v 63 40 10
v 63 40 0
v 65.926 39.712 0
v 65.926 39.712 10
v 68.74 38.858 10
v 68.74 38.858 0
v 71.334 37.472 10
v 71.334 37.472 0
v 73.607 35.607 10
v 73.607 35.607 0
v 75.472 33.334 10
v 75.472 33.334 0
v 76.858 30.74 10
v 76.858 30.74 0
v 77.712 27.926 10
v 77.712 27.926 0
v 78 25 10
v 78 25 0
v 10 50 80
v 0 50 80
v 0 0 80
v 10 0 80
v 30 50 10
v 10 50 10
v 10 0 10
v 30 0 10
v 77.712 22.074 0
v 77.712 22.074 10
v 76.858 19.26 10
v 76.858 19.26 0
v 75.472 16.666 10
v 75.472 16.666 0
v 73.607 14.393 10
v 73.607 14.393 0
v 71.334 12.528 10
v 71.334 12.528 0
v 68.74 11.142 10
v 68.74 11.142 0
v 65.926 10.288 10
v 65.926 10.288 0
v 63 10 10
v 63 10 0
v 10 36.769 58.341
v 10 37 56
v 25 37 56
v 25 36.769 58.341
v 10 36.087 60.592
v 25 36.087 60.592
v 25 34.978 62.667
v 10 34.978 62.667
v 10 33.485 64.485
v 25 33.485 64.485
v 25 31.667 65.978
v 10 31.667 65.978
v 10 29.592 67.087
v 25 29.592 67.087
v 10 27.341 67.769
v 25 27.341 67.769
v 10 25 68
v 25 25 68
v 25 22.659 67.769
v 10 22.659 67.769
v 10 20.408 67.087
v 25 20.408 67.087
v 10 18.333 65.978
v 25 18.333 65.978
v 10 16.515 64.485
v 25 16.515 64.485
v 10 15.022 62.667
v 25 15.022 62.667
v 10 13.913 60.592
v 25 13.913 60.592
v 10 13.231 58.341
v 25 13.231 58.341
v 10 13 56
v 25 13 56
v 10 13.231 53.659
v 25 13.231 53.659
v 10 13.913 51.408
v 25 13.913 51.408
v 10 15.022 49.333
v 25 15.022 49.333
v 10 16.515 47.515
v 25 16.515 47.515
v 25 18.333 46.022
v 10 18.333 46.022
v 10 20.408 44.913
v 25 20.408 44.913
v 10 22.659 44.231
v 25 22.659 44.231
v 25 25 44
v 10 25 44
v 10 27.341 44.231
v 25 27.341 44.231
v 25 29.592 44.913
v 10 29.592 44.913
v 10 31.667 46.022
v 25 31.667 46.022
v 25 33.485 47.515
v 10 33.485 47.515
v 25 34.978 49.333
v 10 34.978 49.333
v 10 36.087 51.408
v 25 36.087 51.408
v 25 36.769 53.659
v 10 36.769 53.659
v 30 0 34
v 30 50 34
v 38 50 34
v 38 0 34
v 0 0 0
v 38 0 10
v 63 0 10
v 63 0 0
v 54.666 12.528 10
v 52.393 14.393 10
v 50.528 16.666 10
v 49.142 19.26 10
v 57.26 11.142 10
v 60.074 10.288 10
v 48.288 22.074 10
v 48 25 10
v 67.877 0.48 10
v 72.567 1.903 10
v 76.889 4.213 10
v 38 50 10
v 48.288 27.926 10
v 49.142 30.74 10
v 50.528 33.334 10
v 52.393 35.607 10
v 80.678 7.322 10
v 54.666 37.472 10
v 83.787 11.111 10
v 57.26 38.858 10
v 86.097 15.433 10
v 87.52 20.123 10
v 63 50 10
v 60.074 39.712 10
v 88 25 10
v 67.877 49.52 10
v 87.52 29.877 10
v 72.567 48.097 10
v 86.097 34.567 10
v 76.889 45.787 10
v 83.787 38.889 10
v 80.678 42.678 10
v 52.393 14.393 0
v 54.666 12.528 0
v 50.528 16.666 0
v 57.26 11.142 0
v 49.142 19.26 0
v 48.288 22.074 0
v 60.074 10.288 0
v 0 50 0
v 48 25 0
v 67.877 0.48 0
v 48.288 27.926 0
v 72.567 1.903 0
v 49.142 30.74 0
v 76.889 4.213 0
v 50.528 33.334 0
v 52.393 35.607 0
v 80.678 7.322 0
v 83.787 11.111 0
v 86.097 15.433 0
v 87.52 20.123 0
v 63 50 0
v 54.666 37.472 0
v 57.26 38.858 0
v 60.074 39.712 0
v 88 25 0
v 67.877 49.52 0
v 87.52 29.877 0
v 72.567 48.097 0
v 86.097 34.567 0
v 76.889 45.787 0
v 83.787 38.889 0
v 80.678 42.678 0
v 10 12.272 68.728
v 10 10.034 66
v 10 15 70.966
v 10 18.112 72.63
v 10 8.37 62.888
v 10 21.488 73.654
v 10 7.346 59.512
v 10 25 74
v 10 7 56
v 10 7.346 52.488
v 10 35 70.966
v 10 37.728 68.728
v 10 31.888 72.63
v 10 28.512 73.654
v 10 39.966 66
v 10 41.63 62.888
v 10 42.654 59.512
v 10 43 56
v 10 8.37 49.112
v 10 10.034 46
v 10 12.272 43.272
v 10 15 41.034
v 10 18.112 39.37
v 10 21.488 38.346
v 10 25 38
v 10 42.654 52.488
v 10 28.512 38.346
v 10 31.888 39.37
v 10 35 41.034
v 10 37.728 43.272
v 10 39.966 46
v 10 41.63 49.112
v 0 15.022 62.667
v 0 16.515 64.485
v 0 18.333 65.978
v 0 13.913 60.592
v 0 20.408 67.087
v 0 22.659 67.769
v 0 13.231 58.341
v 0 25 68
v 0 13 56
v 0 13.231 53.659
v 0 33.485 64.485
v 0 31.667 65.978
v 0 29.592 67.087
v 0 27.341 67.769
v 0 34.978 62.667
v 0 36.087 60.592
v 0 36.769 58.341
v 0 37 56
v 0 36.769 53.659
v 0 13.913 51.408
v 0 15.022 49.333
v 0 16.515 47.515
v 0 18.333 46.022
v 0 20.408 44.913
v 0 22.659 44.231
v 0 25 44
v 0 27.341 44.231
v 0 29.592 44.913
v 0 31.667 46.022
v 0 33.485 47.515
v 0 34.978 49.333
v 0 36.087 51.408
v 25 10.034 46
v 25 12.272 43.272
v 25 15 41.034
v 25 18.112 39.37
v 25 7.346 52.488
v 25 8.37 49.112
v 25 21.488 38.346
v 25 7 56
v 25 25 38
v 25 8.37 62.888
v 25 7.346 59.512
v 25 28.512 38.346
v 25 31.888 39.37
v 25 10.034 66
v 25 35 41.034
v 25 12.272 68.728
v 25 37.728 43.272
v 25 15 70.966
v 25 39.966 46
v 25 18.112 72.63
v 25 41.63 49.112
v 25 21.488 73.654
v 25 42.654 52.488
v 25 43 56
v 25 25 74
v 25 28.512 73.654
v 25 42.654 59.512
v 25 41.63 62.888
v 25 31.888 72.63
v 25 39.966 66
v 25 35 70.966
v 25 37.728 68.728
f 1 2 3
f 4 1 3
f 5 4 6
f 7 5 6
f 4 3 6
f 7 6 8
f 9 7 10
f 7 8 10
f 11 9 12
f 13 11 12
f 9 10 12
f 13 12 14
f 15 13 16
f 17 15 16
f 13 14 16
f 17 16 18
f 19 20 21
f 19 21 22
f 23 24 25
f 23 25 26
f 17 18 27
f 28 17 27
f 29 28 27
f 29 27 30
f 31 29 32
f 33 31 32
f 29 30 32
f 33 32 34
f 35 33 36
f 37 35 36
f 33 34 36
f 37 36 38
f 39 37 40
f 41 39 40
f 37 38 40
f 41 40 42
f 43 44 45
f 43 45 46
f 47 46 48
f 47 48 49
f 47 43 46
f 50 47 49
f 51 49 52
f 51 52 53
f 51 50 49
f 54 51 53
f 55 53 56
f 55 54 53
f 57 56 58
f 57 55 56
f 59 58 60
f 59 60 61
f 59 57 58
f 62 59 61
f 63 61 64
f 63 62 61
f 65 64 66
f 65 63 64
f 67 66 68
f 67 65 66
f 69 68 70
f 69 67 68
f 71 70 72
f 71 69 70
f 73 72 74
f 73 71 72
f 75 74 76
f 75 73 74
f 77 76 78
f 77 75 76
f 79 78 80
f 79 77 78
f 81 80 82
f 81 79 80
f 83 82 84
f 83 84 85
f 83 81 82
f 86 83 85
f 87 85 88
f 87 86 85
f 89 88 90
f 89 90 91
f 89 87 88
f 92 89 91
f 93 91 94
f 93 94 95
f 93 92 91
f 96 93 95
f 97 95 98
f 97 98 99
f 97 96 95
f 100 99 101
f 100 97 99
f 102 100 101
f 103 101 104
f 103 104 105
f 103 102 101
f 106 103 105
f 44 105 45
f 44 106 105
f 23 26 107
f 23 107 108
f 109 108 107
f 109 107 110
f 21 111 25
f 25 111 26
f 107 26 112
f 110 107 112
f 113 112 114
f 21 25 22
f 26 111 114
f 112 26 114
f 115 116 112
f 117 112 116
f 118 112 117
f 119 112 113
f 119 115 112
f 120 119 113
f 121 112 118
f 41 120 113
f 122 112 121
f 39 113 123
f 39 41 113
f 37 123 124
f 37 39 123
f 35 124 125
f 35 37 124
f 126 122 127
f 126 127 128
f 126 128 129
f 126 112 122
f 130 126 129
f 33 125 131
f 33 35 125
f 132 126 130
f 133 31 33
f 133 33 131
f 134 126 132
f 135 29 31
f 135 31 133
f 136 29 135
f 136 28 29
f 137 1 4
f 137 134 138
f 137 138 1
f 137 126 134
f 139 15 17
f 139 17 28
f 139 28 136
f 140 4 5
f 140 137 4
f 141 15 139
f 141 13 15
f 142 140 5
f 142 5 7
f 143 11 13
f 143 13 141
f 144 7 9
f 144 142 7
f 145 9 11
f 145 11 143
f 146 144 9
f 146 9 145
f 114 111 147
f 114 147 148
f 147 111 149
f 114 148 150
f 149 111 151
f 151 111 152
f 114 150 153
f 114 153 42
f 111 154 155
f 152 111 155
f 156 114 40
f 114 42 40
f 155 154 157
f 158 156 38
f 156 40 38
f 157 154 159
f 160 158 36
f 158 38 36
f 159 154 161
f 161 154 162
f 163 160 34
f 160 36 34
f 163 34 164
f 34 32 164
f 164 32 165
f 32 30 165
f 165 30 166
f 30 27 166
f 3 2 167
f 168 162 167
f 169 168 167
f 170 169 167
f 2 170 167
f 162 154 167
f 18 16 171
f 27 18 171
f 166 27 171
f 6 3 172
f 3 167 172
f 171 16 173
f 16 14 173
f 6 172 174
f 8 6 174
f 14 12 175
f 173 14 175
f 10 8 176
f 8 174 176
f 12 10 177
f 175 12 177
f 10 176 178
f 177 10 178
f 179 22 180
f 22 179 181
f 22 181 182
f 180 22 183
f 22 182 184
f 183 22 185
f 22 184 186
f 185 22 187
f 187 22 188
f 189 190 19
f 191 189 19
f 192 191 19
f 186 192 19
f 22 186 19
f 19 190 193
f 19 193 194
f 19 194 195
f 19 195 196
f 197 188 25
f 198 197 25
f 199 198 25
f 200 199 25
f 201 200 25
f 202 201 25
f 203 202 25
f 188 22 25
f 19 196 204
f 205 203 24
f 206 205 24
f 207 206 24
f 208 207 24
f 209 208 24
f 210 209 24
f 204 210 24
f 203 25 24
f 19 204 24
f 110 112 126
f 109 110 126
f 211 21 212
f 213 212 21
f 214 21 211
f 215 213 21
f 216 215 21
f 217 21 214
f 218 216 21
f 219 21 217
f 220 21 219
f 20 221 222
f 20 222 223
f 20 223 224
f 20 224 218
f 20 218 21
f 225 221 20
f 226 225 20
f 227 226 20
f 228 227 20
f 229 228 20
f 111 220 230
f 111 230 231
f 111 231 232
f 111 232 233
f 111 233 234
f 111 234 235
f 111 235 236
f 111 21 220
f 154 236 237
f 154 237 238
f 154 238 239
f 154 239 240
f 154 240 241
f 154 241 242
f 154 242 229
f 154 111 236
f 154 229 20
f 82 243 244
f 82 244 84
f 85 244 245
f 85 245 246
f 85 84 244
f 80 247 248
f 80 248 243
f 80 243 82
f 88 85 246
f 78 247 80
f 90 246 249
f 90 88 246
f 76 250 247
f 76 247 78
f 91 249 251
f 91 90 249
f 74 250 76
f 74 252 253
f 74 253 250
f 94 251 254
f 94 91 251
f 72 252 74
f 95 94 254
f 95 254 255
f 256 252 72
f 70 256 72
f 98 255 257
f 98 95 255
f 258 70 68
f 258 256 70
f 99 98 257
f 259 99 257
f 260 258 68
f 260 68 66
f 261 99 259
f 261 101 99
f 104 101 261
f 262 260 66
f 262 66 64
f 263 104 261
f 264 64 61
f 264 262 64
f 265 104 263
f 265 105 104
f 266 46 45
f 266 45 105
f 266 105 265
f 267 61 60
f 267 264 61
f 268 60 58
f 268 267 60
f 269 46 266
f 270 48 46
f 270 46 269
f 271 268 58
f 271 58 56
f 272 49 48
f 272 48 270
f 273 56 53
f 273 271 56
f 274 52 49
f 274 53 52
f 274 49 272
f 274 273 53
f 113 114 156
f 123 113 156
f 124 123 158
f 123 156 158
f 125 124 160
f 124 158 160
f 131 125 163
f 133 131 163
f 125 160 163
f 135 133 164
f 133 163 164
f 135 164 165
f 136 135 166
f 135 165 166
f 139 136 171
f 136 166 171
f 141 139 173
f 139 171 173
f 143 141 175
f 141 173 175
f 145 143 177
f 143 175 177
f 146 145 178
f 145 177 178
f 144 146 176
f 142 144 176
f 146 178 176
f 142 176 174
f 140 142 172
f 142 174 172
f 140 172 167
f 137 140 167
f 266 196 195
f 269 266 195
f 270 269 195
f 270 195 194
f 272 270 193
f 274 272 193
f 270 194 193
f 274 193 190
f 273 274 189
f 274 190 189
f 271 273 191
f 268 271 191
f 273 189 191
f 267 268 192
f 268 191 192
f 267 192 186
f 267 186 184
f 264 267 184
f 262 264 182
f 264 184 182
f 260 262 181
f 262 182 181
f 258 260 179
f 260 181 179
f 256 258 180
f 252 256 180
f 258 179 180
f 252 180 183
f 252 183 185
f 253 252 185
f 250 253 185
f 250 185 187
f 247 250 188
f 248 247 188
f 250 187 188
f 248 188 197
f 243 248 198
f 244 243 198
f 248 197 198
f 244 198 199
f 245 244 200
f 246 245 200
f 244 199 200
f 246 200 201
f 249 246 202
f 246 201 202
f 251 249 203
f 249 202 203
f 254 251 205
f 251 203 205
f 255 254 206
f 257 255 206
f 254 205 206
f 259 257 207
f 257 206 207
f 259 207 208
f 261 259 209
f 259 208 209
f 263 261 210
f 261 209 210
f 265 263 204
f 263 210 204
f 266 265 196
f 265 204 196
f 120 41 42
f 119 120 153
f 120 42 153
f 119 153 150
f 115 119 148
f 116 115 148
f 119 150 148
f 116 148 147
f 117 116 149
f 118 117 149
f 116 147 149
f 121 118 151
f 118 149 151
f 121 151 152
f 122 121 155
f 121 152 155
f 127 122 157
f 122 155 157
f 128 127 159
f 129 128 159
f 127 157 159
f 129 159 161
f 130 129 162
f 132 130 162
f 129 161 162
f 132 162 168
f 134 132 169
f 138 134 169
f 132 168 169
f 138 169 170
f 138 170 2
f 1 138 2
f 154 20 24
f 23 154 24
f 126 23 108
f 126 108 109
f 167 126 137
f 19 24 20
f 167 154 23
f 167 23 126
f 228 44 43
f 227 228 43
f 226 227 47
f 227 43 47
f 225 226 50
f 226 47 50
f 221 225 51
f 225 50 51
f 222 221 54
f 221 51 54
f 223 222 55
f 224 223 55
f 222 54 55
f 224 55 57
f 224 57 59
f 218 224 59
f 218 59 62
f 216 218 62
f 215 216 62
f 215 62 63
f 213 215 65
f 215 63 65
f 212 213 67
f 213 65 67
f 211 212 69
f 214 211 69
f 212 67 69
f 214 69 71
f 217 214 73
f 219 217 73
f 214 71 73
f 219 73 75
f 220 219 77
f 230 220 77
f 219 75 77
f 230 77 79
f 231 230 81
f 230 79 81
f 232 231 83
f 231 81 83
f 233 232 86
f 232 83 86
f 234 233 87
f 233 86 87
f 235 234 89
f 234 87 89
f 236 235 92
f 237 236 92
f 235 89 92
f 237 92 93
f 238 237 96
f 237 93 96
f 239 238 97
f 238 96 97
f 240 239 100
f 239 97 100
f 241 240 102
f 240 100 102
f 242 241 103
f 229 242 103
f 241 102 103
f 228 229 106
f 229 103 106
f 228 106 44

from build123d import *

# Parameters (mm, degrees)
F1_DEPTH = 10
F2_W     = 8
F2_H     = 50
F3_DEPTH = 24
F4_W     = 10
F4_H     = 50
F5_DEPTH = 70
F6_R     = 18
F6_R_2   = 12
F7_DEPTH = 15
F8_R     = 12
F9_DEPTH = 10


with BuildPart() as f1:
    # F0 (on Top) → F1 (new body)
    with BuildSketch(Plane.XY):
        with BuildLine():
            Line((0, 50), (0, 0))
            Line((0, 0), (63, 0))
            ThreePointArc((63, 0), (88, 25), (63, 50))
            Line((63, 50), (0, 50))
        make_face()
        with BuildLine():
            ThreePointArc((78, 25), (73.606602, 14.393398), (63, 10))
            ThreePointArc((63, 10), (48, 25), (63, 40))
            ThreePointArc((63, 40), (73.606602, 35.606602), (78, 25))
        make_face(mode=Mode.SUBTRACT)
    extrude(amount=F1_DEPTH)

    # F2 (on face) → F3 (join)
    with BuildSketch(Plane.XY.offset(10)):
        with Locations((34, 25)):
            Rectangle(F2_W, F2_H)
    extrude(amount=F3_DEPTH)

    # F4 (on face) → F5 (join)
    with BuildSketch(Plane.XY.offset(10)):
        with Locations((5, 25)):
            Rectangle(F4_W, F4_H)
    extrude(amount=F5_DEPTH)

    # F6 (on face) → F7 (join)
    with BuildSketch(Plane.YZ.offset(10)):
        with Locations((25, 56)):
            Circle(F6_R)
        with Locations((25, 56)):
            Circle(F6_R_2, mode=Mode.SUBTRACT)
    extrude(amount=F7_DEPTH)

    # F8 (on face) → F9 (cut, through all)
    with BuildSketch(Plane.YZ.offset(10)):
        with Locations((25, 56)):
            Circle(F8_R)
    extrude(amount=-F9_DEPTH, mode=Mode.SUBTRACT)


solid = f1.part
